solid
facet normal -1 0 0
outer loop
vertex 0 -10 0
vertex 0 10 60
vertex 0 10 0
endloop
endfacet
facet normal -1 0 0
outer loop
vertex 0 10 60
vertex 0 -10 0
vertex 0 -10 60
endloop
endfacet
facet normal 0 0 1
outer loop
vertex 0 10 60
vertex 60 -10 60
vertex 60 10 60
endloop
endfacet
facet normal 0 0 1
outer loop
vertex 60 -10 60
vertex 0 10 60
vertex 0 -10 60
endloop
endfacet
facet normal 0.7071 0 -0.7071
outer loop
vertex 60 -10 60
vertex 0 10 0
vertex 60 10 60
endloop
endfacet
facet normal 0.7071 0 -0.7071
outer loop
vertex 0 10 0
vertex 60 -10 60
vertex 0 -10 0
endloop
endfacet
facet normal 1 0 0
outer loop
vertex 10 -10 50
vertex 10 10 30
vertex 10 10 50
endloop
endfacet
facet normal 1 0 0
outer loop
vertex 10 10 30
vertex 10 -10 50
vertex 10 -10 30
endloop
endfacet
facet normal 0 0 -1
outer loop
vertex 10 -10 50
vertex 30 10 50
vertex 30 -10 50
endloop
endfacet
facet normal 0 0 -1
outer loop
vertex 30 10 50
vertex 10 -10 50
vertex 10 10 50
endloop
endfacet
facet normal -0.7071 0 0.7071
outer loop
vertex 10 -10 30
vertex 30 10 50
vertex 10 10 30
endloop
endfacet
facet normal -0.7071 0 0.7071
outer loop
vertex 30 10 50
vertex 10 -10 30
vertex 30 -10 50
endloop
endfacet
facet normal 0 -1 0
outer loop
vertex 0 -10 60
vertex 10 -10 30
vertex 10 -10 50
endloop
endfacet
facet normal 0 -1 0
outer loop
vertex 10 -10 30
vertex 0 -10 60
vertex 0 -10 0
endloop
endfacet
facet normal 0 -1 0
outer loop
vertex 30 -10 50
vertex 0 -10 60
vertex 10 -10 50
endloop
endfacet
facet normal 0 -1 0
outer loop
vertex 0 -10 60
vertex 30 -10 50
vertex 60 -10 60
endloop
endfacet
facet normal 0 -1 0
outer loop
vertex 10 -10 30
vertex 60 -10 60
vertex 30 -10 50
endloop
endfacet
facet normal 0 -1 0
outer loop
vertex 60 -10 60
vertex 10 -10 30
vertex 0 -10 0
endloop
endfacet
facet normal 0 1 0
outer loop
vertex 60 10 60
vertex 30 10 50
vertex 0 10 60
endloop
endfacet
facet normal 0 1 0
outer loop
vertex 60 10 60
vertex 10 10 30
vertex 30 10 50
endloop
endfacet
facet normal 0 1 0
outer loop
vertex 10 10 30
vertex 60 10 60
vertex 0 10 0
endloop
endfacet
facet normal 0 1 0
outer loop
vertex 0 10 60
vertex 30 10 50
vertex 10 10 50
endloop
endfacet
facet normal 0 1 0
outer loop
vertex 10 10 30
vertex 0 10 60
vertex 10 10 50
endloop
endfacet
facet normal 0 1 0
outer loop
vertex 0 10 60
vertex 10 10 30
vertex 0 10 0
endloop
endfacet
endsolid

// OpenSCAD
polyhedron
    (points = [
	       [0, -10, 60], [0, 10, 60], [0, 10, 0], [0, -10, 0], [60, -10, 60], [60, 10, 60],
	       [10, -10, 50], [10, 10, 50], [10, 10, 30], [10, -10, 30], [30, -10, 50], [30, 10, 50]
	       ],
     faces = [
  [0,3,2,1], [0,1,5,4],   [2,3,4,5],    // outside
  [6,7,8,9], [7,6,10,11], [11,10,9,8],  // inside
  [0,4,3,0,6,9,10,6],                   // front
  [1,2,5,1,7,11,8,7]                    // back
]
     );
